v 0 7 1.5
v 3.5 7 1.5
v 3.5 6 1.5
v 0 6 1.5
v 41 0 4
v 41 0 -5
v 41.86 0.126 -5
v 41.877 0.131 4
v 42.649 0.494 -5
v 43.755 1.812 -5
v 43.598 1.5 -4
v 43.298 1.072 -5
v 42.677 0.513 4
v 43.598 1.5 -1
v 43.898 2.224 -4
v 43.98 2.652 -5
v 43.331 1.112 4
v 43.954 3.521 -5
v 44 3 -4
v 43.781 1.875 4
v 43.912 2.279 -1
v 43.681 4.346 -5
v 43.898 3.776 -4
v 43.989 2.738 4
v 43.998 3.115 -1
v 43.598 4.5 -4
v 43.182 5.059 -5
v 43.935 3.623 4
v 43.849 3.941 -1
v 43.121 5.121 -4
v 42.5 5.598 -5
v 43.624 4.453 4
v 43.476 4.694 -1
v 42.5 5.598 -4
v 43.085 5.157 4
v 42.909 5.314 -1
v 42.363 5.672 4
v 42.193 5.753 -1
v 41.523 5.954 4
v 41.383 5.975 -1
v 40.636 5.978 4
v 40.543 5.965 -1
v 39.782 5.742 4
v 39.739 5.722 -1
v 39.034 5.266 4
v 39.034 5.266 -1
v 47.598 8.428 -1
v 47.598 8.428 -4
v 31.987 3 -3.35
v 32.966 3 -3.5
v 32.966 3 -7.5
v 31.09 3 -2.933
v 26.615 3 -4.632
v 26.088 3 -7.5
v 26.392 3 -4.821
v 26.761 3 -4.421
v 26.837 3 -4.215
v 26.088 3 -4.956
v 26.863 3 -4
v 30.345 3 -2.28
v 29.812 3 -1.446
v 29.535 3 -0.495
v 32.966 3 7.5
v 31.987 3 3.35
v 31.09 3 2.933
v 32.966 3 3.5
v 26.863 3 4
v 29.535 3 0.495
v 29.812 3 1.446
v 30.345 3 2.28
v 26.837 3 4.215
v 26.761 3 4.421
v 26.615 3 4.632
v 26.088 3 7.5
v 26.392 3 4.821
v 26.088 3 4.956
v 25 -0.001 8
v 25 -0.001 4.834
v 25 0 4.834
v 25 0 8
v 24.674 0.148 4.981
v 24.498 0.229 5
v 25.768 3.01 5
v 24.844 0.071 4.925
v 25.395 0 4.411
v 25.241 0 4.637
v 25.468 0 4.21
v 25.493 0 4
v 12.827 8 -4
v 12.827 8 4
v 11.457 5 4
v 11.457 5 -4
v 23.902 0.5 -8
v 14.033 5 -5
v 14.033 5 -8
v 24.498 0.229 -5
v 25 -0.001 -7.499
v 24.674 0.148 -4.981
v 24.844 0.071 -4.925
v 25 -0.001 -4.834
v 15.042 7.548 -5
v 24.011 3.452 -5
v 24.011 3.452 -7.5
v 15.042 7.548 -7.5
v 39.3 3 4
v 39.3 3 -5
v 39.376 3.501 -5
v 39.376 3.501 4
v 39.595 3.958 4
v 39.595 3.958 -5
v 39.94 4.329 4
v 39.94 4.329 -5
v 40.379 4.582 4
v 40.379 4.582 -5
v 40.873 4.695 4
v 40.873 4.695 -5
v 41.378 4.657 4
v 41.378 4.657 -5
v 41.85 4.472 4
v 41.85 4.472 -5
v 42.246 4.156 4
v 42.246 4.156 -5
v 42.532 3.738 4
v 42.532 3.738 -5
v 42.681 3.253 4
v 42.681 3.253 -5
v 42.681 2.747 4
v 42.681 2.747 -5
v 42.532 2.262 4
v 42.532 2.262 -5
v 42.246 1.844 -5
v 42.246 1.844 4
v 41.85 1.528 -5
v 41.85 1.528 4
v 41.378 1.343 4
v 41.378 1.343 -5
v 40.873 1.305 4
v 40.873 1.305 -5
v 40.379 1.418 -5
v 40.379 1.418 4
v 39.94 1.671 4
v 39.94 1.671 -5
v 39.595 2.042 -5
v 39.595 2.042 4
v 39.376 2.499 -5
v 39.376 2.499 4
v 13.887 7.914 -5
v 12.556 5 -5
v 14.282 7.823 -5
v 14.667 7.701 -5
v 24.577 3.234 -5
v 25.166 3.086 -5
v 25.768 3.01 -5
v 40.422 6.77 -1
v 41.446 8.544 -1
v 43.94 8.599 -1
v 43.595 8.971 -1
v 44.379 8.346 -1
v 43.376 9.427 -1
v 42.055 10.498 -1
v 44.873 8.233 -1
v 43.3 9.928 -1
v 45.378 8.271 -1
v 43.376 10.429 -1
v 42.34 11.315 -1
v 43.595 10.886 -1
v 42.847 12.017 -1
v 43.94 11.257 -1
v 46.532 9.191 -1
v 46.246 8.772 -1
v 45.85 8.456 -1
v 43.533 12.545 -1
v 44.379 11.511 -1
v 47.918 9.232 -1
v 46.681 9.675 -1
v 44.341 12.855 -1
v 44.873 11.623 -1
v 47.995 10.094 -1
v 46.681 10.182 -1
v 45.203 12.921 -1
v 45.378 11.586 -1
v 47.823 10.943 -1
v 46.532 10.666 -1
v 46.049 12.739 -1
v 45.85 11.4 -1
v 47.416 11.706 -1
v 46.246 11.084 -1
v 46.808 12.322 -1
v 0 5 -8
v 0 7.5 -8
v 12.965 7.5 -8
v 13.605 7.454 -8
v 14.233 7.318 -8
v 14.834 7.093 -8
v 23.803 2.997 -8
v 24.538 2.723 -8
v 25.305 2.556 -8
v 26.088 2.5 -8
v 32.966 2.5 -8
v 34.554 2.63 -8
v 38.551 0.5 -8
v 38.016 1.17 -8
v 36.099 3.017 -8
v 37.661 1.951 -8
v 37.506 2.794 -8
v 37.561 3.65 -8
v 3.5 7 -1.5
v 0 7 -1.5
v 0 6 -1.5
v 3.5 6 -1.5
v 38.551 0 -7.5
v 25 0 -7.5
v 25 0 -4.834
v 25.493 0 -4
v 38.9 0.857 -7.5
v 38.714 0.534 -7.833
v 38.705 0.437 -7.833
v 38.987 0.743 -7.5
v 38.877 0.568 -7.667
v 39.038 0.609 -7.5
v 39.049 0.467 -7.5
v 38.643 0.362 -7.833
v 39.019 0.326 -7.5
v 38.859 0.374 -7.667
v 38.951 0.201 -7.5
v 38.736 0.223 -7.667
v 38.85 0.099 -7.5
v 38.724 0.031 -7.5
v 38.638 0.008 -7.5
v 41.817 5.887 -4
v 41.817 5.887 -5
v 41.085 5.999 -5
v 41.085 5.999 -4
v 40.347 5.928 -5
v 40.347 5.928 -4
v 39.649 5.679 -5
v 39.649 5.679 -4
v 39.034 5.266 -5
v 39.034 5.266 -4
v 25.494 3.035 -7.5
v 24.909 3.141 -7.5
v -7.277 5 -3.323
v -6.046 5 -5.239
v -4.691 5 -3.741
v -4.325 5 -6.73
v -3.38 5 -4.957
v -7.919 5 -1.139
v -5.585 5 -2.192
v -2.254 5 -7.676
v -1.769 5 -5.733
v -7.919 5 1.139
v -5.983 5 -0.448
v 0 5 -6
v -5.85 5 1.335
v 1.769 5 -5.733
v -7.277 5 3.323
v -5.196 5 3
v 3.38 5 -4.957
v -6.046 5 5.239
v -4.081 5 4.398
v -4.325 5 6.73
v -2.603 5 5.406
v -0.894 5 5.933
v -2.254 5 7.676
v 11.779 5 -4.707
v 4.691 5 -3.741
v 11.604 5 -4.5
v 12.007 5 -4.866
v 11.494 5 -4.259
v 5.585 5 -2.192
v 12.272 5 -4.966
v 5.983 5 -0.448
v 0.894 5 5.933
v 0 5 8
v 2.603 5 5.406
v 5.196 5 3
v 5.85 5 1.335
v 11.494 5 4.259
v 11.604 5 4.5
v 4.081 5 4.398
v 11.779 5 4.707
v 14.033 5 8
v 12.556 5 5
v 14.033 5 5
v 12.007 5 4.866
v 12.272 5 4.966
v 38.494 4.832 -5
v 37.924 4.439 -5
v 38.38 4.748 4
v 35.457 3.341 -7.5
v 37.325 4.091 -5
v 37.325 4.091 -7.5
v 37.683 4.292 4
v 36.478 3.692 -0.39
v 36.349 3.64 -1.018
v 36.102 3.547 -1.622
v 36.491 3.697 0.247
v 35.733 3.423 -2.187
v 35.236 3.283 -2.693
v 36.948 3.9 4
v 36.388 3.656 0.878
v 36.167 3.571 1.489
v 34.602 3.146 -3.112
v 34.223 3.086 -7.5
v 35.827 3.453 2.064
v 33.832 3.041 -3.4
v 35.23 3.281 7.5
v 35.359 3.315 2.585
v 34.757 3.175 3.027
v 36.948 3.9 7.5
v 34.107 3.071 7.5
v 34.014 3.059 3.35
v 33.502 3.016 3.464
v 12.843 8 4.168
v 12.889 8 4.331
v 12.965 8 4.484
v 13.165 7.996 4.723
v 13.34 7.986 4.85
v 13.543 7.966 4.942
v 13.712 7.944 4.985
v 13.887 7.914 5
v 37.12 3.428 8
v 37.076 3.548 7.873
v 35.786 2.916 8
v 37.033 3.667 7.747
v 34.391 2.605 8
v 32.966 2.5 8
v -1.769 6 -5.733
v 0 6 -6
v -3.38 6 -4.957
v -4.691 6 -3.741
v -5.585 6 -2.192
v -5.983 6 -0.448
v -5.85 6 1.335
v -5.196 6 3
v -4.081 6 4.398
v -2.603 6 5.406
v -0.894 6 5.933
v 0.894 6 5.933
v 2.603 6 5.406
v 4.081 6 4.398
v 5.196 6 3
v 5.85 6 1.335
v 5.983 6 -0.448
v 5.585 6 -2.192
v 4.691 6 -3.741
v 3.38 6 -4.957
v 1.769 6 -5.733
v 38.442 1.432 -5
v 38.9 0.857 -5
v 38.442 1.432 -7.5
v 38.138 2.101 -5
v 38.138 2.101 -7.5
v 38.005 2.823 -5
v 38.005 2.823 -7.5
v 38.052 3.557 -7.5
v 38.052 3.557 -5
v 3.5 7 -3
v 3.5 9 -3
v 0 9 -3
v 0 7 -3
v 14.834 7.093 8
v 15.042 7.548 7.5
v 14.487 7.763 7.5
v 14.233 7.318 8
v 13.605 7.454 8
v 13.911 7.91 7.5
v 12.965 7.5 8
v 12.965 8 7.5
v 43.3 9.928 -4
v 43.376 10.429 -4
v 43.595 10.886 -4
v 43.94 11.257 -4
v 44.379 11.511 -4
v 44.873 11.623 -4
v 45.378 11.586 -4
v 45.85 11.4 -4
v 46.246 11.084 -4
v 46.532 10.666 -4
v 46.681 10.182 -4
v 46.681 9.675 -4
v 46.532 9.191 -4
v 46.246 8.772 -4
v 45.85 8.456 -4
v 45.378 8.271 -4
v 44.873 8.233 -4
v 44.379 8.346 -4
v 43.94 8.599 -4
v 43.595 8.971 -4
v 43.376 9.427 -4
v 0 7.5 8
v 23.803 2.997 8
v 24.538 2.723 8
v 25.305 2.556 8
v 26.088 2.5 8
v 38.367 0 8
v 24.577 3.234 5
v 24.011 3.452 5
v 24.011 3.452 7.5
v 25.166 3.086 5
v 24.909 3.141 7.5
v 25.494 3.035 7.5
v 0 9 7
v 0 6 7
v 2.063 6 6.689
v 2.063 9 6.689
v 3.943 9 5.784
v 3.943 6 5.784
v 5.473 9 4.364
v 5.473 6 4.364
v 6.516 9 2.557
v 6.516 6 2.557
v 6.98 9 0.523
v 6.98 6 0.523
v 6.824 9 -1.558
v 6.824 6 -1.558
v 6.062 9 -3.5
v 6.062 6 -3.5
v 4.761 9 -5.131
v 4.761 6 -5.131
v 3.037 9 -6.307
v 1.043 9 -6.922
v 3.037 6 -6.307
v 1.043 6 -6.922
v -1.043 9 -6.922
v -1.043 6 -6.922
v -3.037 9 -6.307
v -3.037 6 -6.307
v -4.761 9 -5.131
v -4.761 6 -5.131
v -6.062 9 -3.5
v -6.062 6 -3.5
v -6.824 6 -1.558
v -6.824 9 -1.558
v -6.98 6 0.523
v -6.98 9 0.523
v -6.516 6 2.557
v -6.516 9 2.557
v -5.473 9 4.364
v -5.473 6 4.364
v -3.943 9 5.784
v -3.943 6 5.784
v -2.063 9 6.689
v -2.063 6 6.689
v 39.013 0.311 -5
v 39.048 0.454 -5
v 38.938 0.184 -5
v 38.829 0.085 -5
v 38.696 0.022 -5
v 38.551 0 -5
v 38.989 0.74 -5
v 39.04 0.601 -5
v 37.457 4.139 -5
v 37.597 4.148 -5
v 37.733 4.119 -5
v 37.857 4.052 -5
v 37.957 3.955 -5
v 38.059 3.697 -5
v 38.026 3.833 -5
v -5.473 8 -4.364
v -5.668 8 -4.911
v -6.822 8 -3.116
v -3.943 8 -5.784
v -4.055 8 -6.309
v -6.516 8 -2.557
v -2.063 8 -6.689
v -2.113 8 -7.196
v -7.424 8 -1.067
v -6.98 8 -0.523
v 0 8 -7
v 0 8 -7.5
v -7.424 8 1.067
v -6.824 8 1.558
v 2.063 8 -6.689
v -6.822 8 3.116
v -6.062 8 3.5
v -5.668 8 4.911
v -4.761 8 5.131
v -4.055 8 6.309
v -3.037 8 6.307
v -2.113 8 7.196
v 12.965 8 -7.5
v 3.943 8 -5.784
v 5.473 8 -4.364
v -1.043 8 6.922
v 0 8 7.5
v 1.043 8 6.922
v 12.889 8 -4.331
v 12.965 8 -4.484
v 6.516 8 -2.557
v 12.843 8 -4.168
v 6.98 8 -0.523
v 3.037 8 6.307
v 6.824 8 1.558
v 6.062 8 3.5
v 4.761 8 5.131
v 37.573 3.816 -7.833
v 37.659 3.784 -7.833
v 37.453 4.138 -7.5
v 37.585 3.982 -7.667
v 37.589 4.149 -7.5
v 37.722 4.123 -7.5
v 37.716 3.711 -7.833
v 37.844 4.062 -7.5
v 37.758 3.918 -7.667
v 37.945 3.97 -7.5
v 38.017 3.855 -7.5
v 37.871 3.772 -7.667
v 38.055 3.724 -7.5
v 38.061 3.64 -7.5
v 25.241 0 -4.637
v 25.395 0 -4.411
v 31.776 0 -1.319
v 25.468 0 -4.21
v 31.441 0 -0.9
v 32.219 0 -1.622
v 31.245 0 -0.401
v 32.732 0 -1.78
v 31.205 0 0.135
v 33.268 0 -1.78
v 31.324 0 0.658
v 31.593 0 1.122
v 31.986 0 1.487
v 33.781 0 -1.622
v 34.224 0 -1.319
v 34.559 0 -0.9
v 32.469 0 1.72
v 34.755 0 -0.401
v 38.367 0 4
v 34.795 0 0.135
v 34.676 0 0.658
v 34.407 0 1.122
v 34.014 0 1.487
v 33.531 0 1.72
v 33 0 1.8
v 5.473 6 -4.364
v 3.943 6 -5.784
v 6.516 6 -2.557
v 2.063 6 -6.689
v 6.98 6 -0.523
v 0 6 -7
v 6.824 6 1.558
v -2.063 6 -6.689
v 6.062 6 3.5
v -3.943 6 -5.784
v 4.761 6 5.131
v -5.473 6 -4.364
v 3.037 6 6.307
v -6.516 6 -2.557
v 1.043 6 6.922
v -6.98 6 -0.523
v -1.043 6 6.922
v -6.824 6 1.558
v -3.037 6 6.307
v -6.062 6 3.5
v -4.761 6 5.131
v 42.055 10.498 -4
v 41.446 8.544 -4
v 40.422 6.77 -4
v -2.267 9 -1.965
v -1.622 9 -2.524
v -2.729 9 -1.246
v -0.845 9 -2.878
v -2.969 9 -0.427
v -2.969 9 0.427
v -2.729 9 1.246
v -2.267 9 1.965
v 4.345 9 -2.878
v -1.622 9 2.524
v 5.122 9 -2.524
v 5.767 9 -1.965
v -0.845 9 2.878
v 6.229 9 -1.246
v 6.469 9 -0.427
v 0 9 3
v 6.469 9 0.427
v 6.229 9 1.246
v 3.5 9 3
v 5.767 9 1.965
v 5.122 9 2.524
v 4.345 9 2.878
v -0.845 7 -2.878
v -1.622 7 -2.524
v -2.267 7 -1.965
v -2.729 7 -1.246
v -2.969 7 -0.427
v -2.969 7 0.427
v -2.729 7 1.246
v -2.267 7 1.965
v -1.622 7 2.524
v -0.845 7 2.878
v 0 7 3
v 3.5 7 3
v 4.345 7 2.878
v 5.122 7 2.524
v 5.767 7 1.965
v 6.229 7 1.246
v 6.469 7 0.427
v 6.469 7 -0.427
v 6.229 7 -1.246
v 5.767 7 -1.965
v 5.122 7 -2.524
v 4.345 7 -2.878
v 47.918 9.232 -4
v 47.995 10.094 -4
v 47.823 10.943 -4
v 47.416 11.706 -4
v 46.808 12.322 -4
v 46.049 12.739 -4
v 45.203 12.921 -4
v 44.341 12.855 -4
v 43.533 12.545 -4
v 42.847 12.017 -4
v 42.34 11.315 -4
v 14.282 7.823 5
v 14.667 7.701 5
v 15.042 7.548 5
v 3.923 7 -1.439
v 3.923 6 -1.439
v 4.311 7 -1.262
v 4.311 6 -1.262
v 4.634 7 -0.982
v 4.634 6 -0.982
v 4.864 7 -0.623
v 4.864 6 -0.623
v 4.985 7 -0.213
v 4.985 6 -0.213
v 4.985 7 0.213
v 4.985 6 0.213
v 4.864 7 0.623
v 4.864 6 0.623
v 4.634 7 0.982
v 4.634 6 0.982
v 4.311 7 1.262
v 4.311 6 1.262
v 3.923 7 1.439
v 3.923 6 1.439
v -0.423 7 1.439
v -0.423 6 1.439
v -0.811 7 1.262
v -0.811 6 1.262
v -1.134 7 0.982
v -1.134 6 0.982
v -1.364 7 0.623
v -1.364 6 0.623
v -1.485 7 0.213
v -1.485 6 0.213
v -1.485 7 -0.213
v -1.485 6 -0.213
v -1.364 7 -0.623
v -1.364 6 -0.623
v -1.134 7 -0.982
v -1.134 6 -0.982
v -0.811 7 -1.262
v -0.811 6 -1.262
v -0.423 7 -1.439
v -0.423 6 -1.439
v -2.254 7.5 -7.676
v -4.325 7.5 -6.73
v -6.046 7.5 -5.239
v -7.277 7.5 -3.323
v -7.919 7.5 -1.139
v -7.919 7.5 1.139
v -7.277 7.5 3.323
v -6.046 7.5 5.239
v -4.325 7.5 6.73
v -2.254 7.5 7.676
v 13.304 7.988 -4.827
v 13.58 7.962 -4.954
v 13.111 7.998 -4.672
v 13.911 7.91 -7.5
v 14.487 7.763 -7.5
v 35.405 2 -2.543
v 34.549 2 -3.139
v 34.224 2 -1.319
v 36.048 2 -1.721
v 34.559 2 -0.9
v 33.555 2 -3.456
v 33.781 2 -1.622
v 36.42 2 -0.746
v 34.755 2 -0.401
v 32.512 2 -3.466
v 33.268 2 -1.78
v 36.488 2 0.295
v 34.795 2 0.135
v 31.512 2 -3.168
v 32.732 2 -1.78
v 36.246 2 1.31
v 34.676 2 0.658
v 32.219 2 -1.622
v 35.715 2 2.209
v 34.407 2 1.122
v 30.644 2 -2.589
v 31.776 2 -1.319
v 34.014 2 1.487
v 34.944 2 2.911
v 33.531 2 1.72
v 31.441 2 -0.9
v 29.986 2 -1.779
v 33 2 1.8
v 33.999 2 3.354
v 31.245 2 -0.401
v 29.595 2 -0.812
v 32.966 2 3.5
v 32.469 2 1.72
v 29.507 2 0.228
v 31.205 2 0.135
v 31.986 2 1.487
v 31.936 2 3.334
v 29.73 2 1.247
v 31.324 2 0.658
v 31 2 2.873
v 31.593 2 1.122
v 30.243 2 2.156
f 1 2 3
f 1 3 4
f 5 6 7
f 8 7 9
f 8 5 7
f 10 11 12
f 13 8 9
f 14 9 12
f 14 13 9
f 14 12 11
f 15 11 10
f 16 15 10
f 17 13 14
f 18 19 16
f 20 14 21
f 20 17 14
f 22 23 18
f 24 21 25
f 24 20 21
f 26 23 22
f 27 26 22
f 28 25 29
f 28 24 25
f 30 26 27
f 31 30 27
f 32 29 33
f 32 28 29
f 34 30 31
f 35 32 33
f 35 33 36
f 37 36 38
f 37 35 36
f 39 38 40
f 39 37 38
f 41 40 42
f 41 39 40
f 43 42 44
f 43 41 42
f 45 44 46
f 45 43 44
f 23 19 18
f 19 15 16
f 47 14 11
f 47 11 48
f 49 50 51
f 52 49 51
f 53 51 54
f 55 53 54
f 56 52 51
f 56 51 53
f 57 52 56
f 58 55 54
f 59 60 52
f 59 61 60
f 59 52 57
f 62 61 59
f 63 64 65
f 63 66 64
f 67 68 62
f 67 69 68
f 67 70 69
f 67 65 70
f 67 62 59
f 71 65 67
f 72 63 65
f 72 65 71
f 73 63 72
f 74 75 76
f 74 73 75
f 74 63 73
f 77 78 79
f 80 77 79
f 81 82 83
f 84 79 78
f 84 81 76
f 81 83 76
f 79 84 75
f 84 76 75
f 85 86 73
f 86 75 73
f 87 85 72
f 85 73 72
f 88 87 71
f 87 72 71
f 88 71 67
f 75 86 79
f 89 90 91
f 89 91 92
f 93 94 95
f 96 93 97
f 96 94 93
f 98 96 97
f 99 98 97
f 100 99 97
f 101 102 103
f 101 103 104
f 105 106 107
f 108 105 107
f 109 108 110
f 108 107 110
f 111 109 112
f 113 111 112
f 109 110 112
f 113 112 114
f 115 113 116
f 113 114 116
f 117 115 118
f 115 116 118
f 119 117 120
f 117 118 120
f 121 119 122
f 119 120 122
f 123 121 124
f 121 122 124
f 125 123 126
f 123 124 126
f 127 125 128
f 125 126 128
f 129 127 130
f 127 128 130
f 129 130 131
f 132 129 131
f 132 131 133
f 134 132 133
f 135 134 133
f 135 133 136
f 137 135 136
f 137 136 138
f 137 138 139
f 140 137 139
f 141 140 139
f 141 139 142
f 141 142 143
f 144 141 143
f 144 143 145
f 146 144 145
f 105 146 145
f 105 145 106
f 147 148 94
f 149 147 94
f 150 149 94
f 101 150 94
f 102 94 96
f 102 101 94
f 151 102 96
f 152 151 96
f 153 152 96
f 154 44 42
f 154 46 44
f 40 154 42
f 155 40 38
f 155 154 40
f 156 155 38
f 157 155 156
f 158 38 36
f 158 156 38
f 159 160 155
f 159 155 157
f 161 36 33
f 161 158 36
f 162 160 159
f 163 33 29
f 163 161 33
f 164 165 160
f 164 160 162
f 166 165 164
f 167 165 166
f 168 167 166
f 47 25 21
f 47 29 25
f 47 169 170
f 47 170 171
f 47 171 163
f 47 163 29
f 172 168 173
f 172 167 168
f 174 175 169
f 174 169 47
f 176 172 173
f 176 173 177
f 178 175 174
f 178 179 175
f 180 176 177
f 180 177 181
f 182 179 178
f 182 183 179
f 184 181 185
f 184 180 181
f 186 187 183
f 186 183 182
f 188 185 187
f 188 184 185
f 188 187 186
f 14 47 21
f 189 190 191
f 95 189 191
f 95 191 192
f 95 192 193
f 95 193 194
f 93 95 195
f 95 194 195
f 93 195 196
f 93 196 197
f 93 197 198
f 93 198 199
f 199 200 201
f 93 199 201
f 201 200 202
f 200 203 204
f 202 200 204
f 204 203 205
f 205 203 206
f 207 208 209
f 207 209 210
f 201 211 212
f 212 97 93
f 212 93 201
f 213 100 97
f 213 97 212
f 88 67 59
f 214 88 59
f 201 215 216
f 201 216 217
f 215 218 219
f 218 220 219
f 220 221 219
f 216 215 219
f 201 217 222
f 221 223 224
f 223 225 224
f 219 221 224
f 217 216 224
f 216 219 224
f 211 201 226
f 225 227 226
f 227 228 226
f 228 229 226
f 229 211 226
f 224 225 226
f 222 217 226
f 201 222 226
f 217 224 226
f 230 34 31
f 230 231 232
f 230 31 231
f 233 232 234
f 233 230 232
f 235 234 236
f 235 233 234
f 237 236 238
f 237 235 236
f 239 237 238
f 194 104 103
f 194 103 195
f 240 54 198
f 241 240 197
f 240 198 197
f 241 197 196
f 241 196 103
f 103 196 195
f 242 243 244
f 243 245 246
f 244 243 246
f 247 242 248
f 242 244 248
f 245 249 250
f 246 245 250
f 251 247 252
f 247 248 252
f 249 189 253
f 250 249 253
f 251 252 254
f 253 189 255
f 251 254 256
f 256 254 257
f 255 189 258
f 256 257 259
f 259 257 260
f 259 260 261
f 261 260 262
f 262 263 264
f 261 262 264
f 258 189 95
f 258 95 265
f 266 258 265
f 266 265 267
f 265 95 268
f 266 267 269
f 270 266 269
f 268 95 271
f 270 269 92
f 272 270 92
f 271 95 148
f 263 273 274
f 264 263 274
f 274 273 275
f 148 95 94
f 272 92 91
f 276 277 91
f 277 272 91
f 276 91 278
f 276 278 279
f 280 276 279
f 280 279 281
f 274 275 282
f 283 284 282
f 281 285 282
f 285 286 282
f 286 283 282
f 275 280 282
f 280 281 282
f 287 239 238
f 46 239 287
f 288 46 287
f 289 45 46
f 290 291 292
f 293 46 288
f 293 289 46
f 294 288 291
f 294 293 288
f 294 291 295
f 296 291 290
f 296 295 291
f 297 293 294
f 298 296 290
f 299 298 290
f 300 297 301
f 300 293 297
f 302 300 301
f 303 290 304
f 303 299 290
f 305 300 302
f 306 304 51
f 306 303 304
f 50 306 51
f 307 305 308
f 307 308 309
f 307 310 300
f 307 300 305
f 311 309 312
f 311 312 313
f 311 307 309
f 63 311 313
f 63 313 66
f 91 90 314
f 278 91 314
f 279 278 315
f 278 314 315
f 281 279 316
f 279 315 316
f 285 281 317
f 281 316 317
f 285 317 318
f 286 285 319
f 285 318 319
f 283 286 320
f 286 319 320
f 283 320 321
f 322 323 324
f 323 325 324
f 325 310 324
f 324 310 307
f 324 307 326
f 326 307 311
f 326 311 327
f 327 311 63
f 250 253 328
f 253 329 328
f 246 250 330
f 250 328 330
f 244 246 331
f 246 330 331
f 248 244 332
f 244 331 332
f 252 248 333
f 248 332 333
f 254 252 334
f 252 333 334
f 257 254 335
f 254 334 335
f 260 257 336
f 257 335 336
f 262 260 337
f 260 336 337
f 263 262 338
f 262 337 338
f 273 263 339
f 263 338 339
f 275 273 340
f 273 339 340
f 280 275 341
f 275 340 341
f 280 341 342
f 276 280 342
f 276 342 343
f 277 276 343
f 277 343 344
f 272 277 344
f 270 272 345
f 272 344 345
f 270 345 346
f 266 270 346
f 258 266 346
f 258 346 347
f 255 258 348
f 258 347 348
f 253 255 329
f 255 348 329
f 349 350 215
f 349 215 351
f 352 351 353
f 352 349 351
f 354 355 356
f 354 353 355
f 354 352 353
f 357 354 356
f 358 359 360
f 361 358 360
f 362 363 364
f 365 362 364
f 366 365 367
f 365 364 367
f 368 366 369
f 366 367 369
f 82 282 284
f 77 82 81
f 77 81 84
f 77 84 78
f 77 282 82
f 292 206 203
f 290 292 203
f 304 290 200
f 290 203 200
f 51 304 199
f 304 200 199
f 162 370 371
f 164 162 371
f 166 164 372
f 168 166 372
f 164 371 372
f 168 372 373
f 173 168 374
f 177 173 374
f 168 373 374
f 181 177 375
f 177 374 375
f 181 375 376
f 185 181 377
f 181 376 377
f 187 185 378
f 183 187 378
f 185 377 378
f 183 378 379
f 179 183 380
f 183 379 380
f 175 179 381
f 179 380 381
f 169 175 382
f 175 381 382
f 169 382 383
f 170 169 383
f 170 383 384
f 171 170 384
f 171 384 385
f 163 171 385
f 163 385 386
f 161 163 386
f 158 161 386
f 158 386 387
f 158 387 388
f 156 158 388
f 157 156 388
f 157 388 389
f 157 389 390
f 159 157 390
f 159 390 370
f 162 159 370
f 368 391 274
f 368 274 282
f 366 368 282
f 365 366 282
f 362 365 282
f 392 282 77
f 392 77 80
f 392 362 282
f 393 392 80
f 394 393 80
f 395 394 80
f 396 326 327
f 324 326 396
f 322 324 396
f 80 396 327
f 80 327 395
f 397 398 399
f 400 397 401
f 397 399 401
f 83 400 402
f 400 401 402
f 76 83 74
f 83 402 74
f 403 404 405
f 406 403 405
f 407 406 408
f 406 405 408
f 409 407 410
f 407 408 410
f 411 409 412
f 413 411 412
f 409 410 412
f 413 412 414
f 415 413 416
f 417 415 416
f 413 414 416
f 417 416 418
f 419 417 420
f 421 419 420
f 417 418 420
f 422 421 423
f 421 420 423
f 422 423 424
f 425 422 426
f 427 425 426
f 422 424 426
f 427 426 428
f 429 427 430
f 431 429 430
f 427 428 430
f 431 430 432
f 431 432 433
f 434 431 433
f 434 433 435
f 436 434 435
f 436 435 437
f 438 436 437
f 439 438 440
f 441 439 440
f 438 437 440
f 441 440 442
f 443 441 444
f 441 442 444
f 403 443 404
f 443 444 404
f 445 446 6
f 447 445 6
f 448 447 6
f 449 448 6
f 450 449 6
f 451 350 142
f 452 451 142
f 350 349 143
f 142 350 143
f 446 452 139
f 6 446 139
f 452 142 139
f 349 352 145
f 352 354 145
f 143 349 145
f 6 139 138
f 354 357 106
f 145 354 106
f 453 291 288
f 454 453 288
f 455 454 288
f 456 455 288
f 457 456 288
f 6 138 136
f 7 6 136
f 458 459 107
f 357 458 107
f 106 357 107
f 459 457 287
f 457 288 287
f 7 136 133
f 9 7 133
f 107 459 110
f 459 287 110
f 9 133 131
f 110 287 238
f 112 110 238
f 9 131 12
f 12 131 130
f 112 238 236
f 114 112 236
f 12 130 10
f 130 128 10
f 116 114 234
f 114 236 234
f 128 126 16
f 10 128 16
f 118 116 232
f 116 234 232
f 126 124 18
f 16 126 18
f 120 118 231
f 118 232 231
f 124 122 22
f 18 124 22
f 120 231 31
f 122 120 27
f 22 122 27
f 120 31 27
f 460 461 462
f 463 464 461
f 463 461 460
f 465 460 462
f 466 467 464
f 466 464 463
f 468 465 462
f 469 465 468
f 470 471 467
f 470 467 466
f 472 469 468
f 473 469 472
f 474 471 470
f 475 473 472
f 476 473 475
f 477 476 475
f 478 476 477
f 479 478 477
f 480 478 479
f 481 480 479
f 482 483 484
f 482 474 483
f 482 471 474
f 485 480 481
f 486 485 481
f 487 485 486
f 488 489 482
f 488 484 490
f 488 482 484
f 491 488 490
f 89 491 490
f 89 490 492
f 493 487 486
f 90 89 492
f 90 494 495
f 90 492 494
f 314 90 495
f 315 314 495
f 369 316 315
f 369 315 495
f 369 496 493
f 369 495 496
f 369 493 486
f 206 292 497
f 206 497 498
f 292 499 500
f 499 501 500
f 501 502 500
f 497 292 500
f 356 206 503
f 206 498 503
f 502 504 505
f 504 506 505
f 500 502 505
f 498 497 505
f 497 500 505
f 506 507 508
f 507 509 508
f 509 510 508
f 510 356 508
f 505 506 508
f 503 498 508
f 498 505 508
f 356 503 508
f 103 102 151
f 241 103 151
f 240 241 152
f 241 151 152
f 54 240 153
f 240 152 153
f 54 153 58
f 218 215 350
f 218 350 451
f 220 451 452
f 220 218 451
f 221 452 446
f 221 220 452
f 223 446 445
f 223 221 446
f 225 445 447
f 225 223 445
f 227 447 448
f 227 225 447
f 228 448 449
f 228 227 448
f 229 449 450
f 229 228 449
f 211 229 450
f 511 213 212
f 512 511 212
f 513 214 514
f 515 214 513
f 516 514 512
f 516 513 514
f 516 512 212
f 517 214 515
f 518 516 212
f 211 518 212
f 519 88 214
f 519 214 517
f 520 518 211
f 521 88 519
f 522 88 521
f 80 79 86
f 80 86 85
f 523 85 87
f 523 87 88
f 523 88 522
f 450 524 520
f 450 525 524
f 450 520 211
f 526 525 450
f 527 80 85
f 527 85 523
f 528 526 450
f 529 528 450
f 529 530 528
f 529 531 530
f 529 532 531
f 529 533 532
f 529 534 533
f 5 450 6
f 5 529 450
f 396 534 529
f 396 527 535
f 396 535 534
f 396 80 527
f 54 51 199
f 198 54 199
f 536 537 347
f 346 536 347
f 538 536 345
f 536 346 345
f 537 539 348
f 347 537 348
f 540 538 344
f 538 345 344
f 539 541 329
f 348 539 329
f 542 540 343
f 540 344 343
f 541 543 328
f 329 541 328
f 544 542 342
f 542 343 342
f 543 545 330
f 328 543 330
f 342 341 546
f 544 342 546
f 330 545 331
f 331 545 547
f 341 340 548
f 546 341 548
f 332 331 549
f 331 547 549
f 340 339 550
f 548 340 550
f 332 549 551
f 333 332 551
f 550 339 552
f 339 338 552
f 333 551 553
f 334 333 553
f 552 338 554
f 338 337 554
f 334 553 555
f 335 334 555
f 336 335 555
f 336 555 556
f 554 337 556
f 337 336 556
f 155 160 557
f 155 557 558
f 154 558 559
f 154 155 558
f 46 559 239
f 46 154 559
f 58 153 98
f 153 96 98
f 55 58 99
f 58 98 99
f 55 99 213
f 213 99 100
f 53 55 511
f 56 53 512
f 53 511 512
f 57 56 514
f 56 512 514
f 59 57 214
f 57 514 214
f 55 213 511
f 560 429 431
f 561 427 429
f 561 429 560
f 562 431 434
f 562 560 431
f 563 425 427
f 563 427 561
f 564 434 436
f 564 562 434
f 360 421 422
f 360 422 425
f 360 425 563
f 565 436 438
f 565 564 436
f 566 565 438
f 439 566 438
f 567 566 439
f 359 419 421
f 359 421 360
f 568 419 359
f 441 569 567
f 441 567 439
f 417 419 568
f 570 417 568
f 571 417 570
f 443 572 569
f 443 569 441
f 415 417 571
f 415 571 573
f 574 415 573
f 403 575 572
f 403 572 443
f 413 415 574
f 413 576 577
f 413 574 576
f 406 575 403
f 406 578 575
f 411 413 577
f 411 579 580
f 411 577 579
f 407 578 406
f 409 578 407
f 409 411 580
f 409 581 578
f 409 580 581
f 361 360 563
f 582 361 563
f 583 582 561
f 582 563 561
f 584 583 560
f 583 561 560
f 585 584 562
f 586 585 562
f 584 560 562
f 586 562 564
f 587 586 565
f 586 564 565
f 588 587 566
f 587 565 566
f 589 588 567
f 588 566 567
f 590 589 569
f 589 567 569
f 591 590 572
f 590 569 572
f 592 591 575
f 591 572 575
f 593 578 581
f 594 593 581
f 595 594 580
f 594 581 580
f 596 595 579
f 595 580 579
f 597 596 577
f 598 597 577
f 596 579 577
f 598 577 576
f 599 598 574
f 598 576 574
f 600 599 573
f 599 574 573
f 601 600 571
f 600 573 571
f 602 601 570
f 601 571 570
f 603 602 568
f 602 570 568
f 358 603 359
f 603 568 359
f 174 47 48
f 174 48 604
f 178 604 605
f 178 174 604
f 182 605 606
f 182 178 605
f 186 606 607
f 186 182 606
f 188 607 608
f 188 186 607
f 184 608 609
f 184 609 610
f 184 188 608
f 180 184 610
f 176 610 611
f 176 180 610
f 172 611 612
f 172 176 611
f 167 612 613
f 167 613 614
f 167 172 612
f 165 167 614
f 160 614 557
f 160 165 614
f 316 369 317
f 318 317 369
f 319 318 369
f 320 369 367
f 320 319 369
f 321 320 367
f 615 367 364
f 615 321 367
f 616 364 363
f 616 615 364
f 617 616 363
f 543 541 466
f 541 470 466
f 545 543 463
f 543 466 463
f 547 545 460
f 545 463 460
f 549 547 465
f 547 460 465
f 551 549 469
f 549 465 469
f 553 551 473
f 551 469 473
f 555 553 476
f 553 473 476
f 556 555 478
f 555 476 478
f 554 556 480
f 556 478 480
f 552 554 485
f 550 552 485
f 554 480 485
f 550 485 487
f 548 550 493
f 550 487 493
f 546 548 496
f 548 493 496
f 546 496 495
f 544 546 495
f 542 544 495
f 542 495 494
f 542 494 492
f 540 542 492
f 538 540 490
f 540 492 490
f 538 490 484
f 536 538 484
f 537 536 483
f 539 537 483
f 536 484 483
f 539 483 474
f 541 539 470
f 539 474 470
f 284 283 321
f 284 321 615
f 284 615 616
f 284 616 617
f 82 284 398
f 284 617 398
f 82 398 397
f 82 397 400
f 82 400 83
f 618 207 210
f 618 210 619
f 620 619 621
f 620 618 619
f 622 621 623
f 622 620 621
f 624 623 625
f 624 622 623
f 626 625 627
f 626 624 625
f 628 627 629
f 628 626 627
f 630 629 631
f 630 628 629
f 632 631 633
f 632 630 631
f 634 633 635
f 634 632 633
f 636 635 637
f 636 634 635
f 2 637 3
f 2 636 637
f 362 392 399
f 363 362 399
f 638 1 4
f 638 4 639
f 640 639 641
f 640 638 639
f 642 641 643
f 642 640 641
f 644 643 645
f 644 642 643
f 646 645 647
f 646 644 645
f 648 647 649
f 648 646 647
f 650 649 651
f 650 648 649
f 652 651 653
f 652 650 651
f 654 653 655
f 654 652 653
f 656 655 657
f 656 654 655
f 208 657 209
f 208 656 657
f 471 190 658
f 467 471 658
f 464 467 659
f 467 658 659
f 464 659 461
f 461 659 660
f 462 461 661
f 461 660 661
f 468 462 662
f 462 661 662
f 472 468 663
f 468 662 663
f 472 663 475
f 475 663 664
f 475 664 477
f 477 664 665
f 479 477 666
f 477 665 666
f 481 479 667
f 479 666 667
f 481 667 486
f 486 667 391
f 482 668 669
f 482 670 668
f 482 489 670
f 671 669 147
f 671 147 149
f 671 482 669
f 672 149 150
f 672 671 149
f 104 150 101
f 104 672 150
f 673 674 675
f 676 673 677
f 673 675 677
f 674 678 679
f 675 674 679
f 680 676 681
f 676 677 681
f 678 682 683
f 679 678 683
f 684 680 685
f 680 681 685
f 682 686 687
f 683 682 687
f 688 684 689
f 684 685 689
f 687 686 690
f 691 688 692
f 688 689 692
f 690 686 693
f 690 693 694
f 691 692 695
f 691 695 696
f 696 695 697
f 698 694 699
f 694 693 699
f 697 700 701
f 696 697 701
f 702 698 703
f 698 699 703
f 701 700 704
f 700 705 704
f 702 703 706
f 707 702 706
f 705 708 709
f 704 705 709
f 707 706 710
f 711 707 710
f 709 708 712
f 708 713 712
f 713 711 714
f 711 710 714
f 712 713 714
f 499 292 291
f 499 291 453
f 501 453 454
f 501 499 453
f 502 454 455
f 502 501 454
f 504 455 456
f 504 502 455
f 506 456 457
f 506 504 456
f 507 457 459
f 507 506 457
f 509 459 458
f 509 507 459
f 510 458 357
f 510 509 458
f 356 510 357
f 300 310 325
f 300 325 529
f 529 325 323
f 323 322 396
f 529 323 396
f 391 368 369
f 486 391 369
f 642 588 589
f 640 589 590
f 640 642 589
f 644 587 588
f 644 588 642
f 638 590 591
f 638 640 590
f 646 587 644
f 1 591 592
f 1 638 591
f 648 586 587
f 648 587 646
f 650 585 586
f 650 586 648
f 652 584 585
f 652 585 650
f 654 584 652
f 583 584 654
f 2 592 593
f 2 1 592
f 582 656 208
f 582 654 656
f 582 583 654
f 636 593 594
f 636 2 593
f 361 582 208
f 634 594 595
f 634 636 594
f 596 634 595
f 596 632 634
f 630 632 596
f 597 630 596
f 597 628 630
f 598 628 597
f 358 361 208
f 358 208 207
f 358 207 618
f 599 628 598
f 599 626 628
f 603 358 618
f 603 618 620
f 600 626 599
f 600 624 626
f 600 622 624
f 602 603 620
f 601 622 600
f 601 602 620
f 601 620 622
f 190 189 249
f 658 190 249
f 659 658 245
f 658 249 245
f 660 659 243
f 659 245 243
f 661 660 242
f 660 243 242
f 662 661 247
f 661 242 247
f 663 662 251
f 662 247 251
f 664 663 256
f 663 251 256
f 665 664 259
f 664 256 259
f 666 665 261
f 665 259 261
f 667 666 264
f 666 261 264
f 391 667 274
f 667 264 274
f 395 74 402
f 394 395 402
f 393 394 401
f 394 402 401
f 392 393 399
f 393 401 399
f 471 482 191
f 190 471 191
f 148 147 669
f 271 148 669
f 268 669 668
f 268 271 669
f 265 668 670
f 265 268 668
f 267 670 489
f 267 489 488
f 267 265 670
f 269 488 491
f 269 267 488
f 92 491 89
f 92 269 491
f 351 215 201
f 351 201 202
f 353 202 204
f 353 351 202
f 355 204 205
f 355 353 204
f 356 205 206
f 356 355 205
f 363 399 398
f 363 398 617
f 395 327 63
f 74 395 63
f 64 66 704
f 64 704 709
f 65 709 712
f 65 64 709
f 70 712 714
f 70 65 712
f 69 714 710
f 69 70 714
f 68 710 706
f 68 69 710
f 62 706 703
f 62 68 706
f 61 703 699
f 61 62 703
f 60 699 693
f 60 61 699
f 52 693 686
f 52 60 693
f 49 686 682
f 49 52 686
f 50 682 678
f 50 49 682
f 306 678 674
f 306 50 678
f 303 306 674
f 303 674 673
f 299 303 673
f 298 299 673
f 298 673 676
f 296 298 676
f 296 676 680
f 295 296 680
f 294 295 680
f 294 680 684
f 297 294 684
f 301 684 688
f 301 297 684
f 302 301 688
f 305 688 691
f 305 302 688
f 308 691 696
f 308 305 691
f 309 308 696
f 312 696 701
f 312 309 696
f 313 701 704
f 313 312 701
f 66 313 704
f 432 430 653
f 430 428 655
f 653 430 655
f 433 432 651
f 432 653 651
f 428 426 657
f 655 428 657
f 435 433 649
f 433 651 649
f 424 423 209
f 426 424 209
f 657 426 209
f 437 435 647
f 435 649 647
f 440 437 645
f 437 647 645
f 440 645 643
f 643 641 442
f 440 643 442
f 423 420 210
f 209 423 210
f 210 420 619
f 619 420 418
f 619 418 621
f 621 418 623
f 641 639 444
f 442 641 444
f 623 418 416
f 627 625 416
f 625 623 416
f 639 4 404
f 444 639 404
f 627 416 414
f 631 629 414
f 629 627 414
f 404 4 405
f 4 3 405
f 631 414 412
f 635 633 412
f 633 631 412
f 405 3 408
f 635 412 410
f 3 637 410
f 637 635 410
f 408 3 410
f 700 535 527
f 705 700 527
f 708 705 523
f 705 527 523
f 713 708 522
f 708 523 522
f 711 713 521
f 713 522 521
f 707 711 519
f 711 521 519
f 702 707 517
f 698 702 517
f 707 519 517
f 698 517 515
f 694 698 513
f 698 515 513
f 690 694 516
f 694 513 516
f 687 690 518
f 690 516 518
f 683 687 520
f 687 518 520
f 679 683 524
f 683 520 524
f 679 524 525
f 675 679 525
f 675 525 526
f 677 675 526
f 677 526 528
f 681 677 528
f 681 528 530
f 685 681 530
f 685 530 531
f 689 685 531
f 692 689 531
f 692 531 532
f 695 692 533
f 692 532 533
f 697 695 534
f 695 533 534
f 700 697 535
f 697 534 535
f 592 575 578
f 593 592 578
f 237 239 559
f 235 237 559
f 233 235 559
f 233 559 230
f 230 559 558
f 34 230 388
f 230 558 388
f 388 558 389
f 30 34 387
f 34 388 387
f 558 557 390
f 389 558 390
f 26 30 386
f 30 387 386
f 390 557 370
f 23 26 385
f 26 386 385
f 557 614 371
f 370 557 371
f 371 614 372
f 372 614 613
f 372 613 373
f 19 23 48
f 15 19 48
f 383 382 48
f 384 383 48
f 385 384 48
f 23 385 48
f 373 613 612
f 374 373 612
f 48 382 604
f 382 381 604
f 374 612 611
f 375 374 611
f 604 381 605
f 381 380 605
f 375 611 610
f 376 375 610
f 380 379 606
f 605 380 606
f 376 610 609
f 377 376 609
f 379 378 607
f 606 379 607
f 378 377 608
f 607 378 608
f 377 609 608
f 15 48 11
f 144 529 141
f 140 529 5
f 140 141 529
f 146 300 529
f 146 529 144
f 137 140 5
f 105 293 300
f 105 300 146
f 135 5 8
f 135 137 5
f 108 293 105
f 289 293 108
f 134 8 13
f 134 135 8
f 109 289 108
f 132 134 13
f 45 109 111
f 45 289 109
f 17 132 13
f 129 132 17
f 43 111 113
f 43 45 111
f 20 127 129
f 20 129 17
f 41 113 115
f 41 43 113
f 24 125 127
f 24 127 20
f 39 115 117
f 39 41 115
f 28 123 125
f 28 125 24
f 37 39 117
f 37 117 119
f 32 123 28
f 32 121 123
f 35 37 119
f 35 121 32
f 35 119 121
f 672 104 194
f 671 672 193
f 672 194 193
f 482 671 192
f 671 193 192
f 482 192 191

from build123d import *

# Parameters (mm, degrees)
BOSS_EXTRUDE1_DEPTH  = 8
BOSS_EXTRUDE2_START  = -1
BOSS_EXTRUDE2_DEPTH  = 3
CUT_EXTRUDE1_START   = -3
SKETCH2_R            = 3
CUT_EXTRUDE1_DEPTH   = 3
CUT_EXTRUDE2_DEPTH   = 4
SKETCH4_R            = 3.5
CUT_EXTRUDE3_DEPTH   = 8
M3_CLEARANCE_HOLE2_D = 3.4
M3_CLEARANCE_HOLE3_D = 3.4
SKETCH10_R           = 8
BOSS_EXTRUDE3_DEPTH  = 3
BOSS_EXTRUDE6_DEPTH  = 8
SKETCH17_W           = 6
SKETCH17_H           = 6
SKETCH18_R           = 7
BOSS_EXTRUDE5_DEPTH  = 3
CUT_EXTRUDE6_DEPTH   = 2
CUT_EXTRUDE7_DEPTH   = 50.487466177
FILLET5_START        = -8
FILLET5_DEPTH        = 3
SKETCH22_W           = 1.8
SKETCH22_H           = 2.051551118
FILLET12_R           = 5
CHAMFER2_SIZE        = 0.5
SKETCH27_W           = 14.844395474
SKETCH27_H           = 10
CUT_EXTRUDE11_DEPTH  = 13.5
FILLET13_R           = 1


with BuildPart() as part:
    # Sketch1 → Boss-Extrude1 (new, symmetric)
    with BuildSketch(Plane.XY):
        with BuildLine():
            ThreePointArc((42.5, 5.598076211), (40.713681898, 5.986305735), (39.03367226, 5.265735028))
            ThreePointArc((39.03367226, 5.265735028), (36.204522615, 3.584912586), (32.966138903, 3))
            Line((32.966138903, 3), (25, 3))
            Line((25, 3), (25, 0))
            Line((25, 0), (41, 0))
            ThreePointArc((41, 0), (43.897777479, 2.223542865), (42.5, 5.598076211))
        make_face()
    extrude(amount=BOSS_EXTRUDE1_DEPTH, both=True)

    # Sketch1<3> → Boss-Extrude2 (add)
    with BuildSketch(Plane.XY.offset(BOSS_EXTRUDE2_START)):
        with BuildLine():
            ThreePointArc((39.03367226, 5.265735028), (42.909179564, 5.314094508), (43.598076211, 1.5))
            Line((43.598076211, 1.5), (47.598076211, 8.42820323))
            ThreePointArc((47.598076211, 8.42820323), (46.049474916, 12.738648462), (42.054652064, 10.498225632))
            ThreePointArc((42.054652064, 10.498225632), (40.983069487, 7.628577072), (39.03367226, 5.265735028))
        make_face()
    extrude(amount=-BOSS_EXTRUDE2_DEPTH)

    # Sketch2 → Cut-Extrude1 (cut)
    with BuildSketch(Plane(origin=(0, 0, -8), x_dir=(-1, 0, 0), z_dir=(0, 0, -1)).offset(CUT_EXTRUDE1_START)):
        with Locations((-41, 3)):
            Circle(SKETCH2_R)
    extrude(amount=CUT_EXTRUDE1_DEPTH, mode=Mode.SUBTRACT)

    # Sketch3 → Cut-Extrude2 (cut)
    with BuildSketch(Plane.XY.offset(8)):
        with BuildLine():
            ThreePointArc((39.033672152, 5.265734934), (38.036918658, 4.512343291), (36.947790029, 3.900039993))
            Line((36.947790029, 3.900039993), (38.367288499, 0))
            Line((38.367288499, 0), (41, 0))
            ThreePointArc((41, 0), (43.810445232, 4.049474916), (39.033672152, 5.265734934))
        make_face()
    extrude(amount=-CUT_EXTRUDE2_DEPTH, mode=Mode.SUBTRACT)

    # Sketch4 → Cut-Extrude3 (cut)
    with BuildSketch(Plane(origin=(0, 10, 0), x_dir=(-1, 0, 0), z_dir=(0, -1, 0))):
        with Locations(Location((-33, 0, 0), (0, 0, 270.554322343))):
            Circle(SKETCH4_R)
    extrude(amount=CUT_EXTRUDE3_DEPTH, mode=Mode.SUBTRACT)

    # M3 Clearance Hole2 (through all)
    with Locations(Plane(origin=(41, 3, 4), x_dir=(1, 0, 0), z_dir=(0, 0, 1))):
        with Locations((0, 0)):
            Hole(M3_CLEARANCE_HOLE2_D / 2)

    # M3 Clearance Hole3 (through all)
    with Locations(Plane(origin=(45, 9.92820323, -1), x_dir=(1, 0, 0), z_dir=(0, 0, 1))):
        with Locations((0, 0)):
            Hole(M3_CLEARANCE_HOLE3_D / 2)



with BuildPart() as body_2:
    # Sketch10 → Boss-Extrude3 (new body)
    with BuildSketch(Plane(origin=(0, 5, 0), x_dir=(1, 0, 0), z_dir=(0, 1, 0))):
        with Locations(Location((0, 0, 0), (0, 0, 270))):
            Circle(SKETCH10_R)
    extrude(amount=BOSS_EXTRUDE3_DEPTH)


with BuildPart() as part_1:
    add(part.part)

    add(body_2.part)  # Boss-Extrude6 merges body 2
    # Sketch25 → Boss-Extrude6 (add, symmetric)
    with BuildSketch(Plane.XY):
        Polygon((0, 8), (0, 5), (14.033339128, 5), (25, -0.000517039), (25, 3), (14.052552674, 8), align=None)
    extrude(amount=BOSS_EXTRUDE6_DEPTH, both=True)

    # Sketch17 → Cut-Revolve1 (revolve, cut)
    with BuildSketch(Plane.XY, mode=Mode.PRIVATE) as cut_revolve1_sk:
        Polygon((0, 8), (0, 6), (6, 6), (7, 6), (7, 8), align=None)
        with Locations((3, 3)):
            Rectangle(SKETCH17_W, SKETCH17_H)
    revolve(cut_revolve1_sk.sketch.rotate(Axis((0, 6, 0), (0, 1, 0)), 90), axis=Axis((0, 6, 0), (0, 1, 0)), mode=Mode.SUBTRACT)

    # Fillet5: read off the stored shape, not the designer's step
    # Fillet5 outline → Fillet5 (cut)
    with BuildSketch(Plane.XY.offset(FILLET5_START)):
        with BuildLine():
            ThreePointArc((41, 0), (39.866106581, 0.222539701), (38.900437363, 0.857142857))
            ThreePointArc((38.900437363, 0.857142857), (39.013420307, 0.311017763), (38.550510257, 0))
            Line((38.550510257, 0), (41, 0))
        make_face()
        with BuildLine():
            ThreePointArc((37.325347494, 4.090624707), (37.856812417, 4.05249044), (38.052112821, 3.556741573))
            ThreePointArc((38.052112821, 3.556741573), (38.398550037, 4.494141254), (39.033672152, 5.265734934))
            ThreePointArc((39.033672152, 5.265734934), (38.212514543, 4.630198979), (37.325347494, 4.090624707))
        make_face()
    extrude(amount=FILLET5_DEPTH, mode=Mode.SUBTRACT)

    # Sketch22 → M3 Clearance Hole5 (revolve, cut)
    with BuildSketch(Plane(origin=(33, 2, 0), x_dir=(0, 0, 1), z_dir=(1, 0, 0))):
        with Locations((0.9, 1.025775559)):
            Rectangle(SKETCH22_W, SKETCH22_H)
    revolve(axis=Axis((33, 8.35, 0), (0, -1, 0)), mode=Mode.SUBTRACT)

    # Fillet12
    fillet12_edges = [part_1.edges().sort_by_distance(p)[0] for p in [
        (25, 3, 0),
        (14.052552674, 8, 0),
    ]]
    fillet(fillet12_edges, radius=FILLET12_R)

    # Chamfer2
    # the kernel refuses this chamfer: 0.5 mm, written as the material it takes off along each edge
    with BuildSketch(Plane(origin=(41, 3, -8), x_dir=(-0.6998542122558625, -0.7142857142542653, 0), z_dir=(0.7142857142542653, -0.6998542122558625, 0))) as chamfer2_piece_1:
        with BuildLine():
            Line((3.514142136, 0.014142136), (2.985857864, -0.514142136))
            Line((2.985857864, -0.514142136), (2.975857864, -0.514142136))
            ThreePointArc((2.975857864, -0.514142136), (2.99, -0.257071068), (2.99, 0))
            Line((2.99, 0), (3, 0.01))
            ThreePointArc((3, 0.01), (3.257071068, 0.01), (3.514142136, 0.024142136))
            Line((3.514142136, 0.024142136), (3.514142136, 0.014142136))
        make_face()
    revolve(axis=Axis((41, 3, -8), (0, 0, -1)), revolution_arc=56.279671506, mode=Mode.SUBTRACT)
    with BuildSketch(Plane(origin=(37.560798292, 3.649531835, -8), x_dir=(-0.4709015955498913, 0.8821857442220241, 0), z_dir=(-0.8821857442220241, -0.4709015955498913, 0))) as chamfer2_piece_2:
        with BuildLine():
            Line((0.5 - CHAMFER2_SIZE, -CHAMFER2_SIZE * 8.25029964485e-10), (0.514142135, -0.514142136))
            Line((0.514142135, -0.514142136), (0.524142135, -0.514142136))
            ThreePointArc((0.524142135, -0.514142136), (0.51, -0.257071068), (0.51, 0))
            Line((0.51, 0), (0.5, 0.01))
            Line((0.5, 0.01), (0, 0.023753138))
            Line((0, 0.023753138), (0.5 - CHAMFER2_SIZE, -CHAMFER2_SIZE * 8.25029964485e-10))
        make_face()
    revolve(axis=Axis((37.560798292, 3.649531835, -8), (0, 0, -1)), revolution_arc=128.787817104, mode=Mode.SUBTRACT)
    with BuildSketch(Plane(origin=(38.550510258, 0.5, -8), x_dir=(0.6998542113861314, 0.7142857151064245, 0), z_dir=(-0.7142857151064245, 0.6998542113861314, 0))) as chamfer2_piece_3:
        with BuildLine():
            Line((0.5 - CHAMFER2_SIZE, -CHAMFER2_SIZE * 6.45420560746e-10), (0.514142135, -0.514142136))
            Line((0.514142135, -0.514142136), (0.524142135, -0.514142136))
            ThreePointArc((0.524142135, -0.514142136), (0.51, -0.257071068), (0.51, 0))
            Line((0.51, 0), (0.5, 0.01))
            Line((0.5, 0.01), (0, 0.023753138))
            Line((0, 0.023753138), (0.5 - CHAMFER2_SIZE, -CHAMFER2_SIZE * 6.45420560746e-10))
        make_face()
    revolve(axis=Axis((38.550510258, 0.5, -8), (0, 0, -1)), revolution_arc=135.584691531, mode=Mode.SUBTRACT)
    with BuildSketch(Plane(origin=(12.964776572, 8, -8), x_dir=(0, 0, 1), z_dir=(-1, 0, 0)), Plane(origin=(12.964776572, 8, 8), x_dir=(0, -1, 0), z_dir=(-1, 0, 0))) as chamfer2_piece_4:
        with BuildLine():
            Line((0.514142136, 0.014142136), (-0.014142136, -0.514142136))
            Line((-0.014142136, -0.514142136), (-0.024142136, -0.514142136))
            ThreePointArc((-0.024142136, -0.514142136), (-0.01, -0.257071068), (-0.01, 0))
            Line((-0.01, 0), (0, 0.01))
            ThreePointArc((0, 0.01), (0.257071068, 0.01), (0.514142136, 0.024142136))
            Line((0.514142136, 0.024142136), (0.514142136, 0.014142136))
        make_face()
    extrude(amount=12.964776572, mode=Mode.SUBTRACT)
    with BuildSketch(Plane(origin=(24.01054005, 3.451913547, -8), x_dir=(0, 0, 1), z_dir=(-0.9096172905898658, 0.41544721043708044, 0)), Plane(origin=(24.01054005, 3.451913547, 8), x_dir=(-0.4154472104370804, -0.9096172905898657, 0), z_dir=(-0.9096172905898658, 0.41544721043708044, 0))) as chamfer2_piece_5:
        with BuildLine():
            Line((0.514142136, 0.014142136), (-0.014142136, -0.514142136))
            Line((-0.014142136, -0.514142136), (-0.024142136, -0.514142136))
            ThreePointArc((-0.024142136, -0.514142136), (-0.01, -0.257071068), (-0.01, 0))
            Line((-0.01, 0), (0, 0.01))
            ThreePointArc((0, 0.01), (0.257071068, 0.01), (0.514142136, 0.024142136))
            Line((0.514142136, 0.024142136), (0.514142136, 0.014142136))
        make_face()
    extrude(amount=9.859671224, mode=Mode.SUBTRACT)
    with BuildSketch(Plane(origin=(32.966138903, 3, -8), x_dir=(0, 0, 1), z_dir=(-1, 0, 0)), Plane(origin=(32.966138903, 3, 8), x_dir=(0, -1, 0), z_dir=(-1, 0, 0))) as chamfer2_piece_6:
        with BuildLine():
            Line((0.514142136, 0.014142136), (-0.014142136, -0.514142136))
            Line((-0.014142136, -0.514142136), (-0.024142136, -0.514142136))
            ThreePointArc((-0.024142136, -0.514142136), (-0.01, -0.257071068), (-0.01, 0))
            Line((-0.01, 0), (0, 0.01))
            ThreePointArc((0, 0.01), (0.257071068, 0.01), (0.514142136, 0.024142136))
            Line((0.514142136, 0.024142136), (0.514142136, 0.014142136))
        make_face()
    extrude(amount=6.878362801, mode=Mode.SUBTRACT)
    with BuildSketch(Plane(origin=(12.964776572, 3, -8), x_dir=(0.4154472104370811, 0.9096172905898655, 0), z_dir=(0.9096172905898655, -0.4154472104370811, 0))) as chamfer2_piece_7:
        with BuildLine():
            Line((5.014142136, 0.514142136), (4.485857864, -0.014142136))
            Line((4.485857864, -0.014142136), (4.485857864, -0.024142136))
            ThreePointArc((4.485857864, -0.024142136), (4.742928932, -0.01), (5, -0.01))
            Line((5, -0.01), (5.01, 0))
            ThreePointArc((5.01, 0), (5.01, 0.257071068), (5.024142136, 0.514142136))
            Line((5.024142136, 0.514142136), (5.014142136, 0.514142136))
        make_face()
    revolve(axis=Axis((12.964776572, 3, -8), (0, 0, 1)), revolution_arc=24.54748261, mode=Mode.SUBTRACT)
    with BuildSketch(Plane(origin=(12.964776572, 3, 8), x_dir=(0.4154472104370811, 0.9096172905898655, 0), z_dir=(0.9096172905898655, -0.4154472104370811, 0))) as chamfer2_piece_8:
        with BuildLine():
            Line((4.485857864, 0.014142136), (5.014142136, -0.514142136))
            Line((5.014142136, -0.514142136), (5.024142136, -0.514142136))
            ThreePointArc((5.024142136, -0.514142136), (5.01, -0.257071068), (5.01, 0))
            Line((5.01, 0), (5, 0.01))
            ThreePointArc((5, 0.01), (4.742928932, 0.01), (4.485857864, 0.024142136))
            Line((4.485857864, 0.024142136), (4.485857864, 0.014142136))
        make_face()
    revolve(axis=Axis((12.964776572, 3, 8), (0, 0, 1)), revolution_arc=24.54748261, mode=Mode.SUBTRACT)
    with BuildSketch(Plane(origin=(26.087776102, 8, -8), x_dir=(0, -1, 0), z_dir=(1, 0, 0))) as chamfer2_piece_9:
        with BuildLine():
            Line((4.985857864, -0.514142136), (5.514142136, 0.014142136))
            Line((5.514142136, 0.014142136), (5.514142136, 0.024142136))
            ThreePointArc((5.514142136, 0.024142136), (5.257071068, 0.01), (5, 0.01))
            Line((5, 0.01), (4.99, 0))
            ThreePointArc((4.99, 0), (4.99, -0.257071068), (4.975857864, -0.514142136))
            Line((4.975857864, -0.514142136), (4.985857864, -0.514142136))
        make_face()
    revolve(axis=Axis((26.087776102, 8, -8), (0, 0, -1)), revolution_arc=24.54748261, mode=Mode.SUBTRACT)
    with BuildSketch(Plane(origin=(26.087776102, 8, 8), x_dir=(0, -1, 0), z_dir=(1, 0, 0))) as chamfer2_piece_10:
        with BuildLine():
            Line((5.514142136, -0.014142136), (4.985857864, 0.514142136))
            Line((4.985857864, 0.514142136), (4.975857864, 0.514142136))
            ThreePointArc((4.975857864, 0.514142136), (4.99, 0.257071068), (4.99, 0))
            Line((4.99, 0), (5, -0.01))
            ThreePointArc((5, -0.01), (5.257071068, -0.01), (5.514142136, -0.024142136))
            Line((5.514142136, -0.024142136), (5.514142136, -0.014142136))
        make_face()
    revolve(axis=Axis((26.087776102, 8, 8), (0, 0, -1)), revolution_arc=24.54748261, mode=Mode.SUBTRACT)
    with BuildSketch(Plane(origin=(32.966138903, 12.25715402, 8), x_dir=(0.550971832426983, -0.8345238402059301, 0), z_dir=(0.8345238402059301, 0.550971832426983, 0))) as chamfer2_piece_11:
        with BuildLine():
            Line((9.771296156, -0.014142136), (9.243011885, 0.514142136))
            Line((9.243011885, 0.514142136), (9.233011885, 0.514142136))
            ThreePointArc((9.233011885, 0.514142136), (9.24715402, 0.257071068), (9.24715402, 0))
            Line((9.24715402, 0), (9.25715402, -0.01))
            ThreePointArc((9.25715402, -0.01), (9.514225088, -0.01), (9.771296156, -0.024142136))
            Line((9.771296156, -0.024142136), (9.771296156, -0.014142136))
        make_face()
    revolve(axis=Axis((32.966138903, 12.25715402, 8), (0, 0, -1)), revolution_arc=33.433710309, mode=Mode.SUBTRACT)
    with BuildSketch(Plane(origin=(32.966138903, 12.25715402, -8), x_dir=(0.4709015947015472, -0.8821857446748615, 0), z_dir=(0.8821857446748615, 0.4709015947015472, 0))) as chamfer2_piece_12:
        with BuildLine():
            Line((9.243011885, -0.514142136), (9.771296156, 0.014142136))
            Line((9.771296156, 0.014142136), (9.771296156, 0.024142136))
            ThreePointArc((9.771296156, 0.024142136), (9.514225088, 0.01), (9.25715402, 0.01))
            Line((9.25715402, 0.01), (9.24715402, 0))
            ThreePointArc((9.24715402, 0), (9.24715402, -0.257071068), (9.233011885, -0.514142136))
            Line((9.233011885, -0.514142136), (9.243011885, -0.514142136))
        make_face()
    revolve(axis=Axis((32.966138903, 12.25715402, -8), (0, 0, -1)), revolution_arc=28.092836925, mode=Mode.SUBTRACT)
    with BuildSketch(Plane(origin=(23.714158506, 0, -8), x_dir=(0, 0, 1), z_dir=(1, 0, 0))) as chamfer2_piece_13:
        with BuildLine():
            Line((0.514142136, 0.014142136), (-0.014142136, -0.514142136))
            Line((-0.014142136, -0.514142136), (-0.024142136, -0.514142136))
            ThreePointArc((-0.024142136, -0.514142136), (-0.01, -0.257071068), (-0.01, 0))
            Line((-0.01, 0), (0, 0.01))
            ThreePointArc((0, 0.01), (0.257071068, 0.01), (0.514142136, 0.024142136))
            Line((0.514142136, 0.024142136), (0.514142136, 0.014142136))
        make_face()
    extrude(amount=14.836351751, mode=Mode.SUBTRACT)
    with BuildSketch(Plane(origin=(0, 8, 0), x_dir=(0, 0, -1), z_dir=(1, 0, 0))) as chamfer2_piece_14:
        with BuildLine():
            Line((7.485857864, 0.014142136), (8.014142136, -0.514142136))
            Line((8.014142136, -0.514142136), (8.024142136, -0.514142136))
            ThreePointArc((8.024142136, -0.514142136), (8.01, -0.257071068), (8.01, 0))
            Line((8.01, 0), (8, 0.01))
            ThreePointArc((8, 0.01), (7.742928932, 0.01), (7.485857864, 0.024142136))
            Line((7.485857864, 0.024142136), (7.485857864, 0.014142136))
        make_face()
    revolve(axis=Axis((0, 8, 0), (0, 1, 0)), revolution_arc=180, mode=Mode.SUBTRACT)

    # Sketch27 → Cut-Extrude11 (cut, symmetric)
    with BuildSketch(Plane(origin=(5.448603514, 11.929659995, 0), x_dir=(0.9096172905898658, -0.4154472104370803, 0), z_dir=(0.41544721043708027, 0.9096172905898657, 0))):
        with Locations((15.766417415, 0)):
            Rectangle(SKETCH27_W, SKETCH27_H)
    extrude(amount=CUT_EXTRUDE11_DEPTH, both=True, mode=Mode.SUBTRACT)

    # Fillet13
    fillet13_edges = [part_1.edges().sort_by_distance(p)[0] for p in [
        (26.1778071, 1.5, 5),
        (26.1778071, 1.5, -5),
        (12.14205871, 6.5, 5),
        (12.14205871, 6.5, -5),
    ]]
    fillet(fillet13_edges, radius=FILLET13_R)


with BuildPart() as body_2_2:
    # Sketch18 → Boss-Extrude5 (new body)
    with BuildSketch(Plane(origin=(0, 6, 0), x_dir=(1, 0, 0), z_dir=(0, 1, 0))):
        with Locations(Location((0, 0, 0), (0, 0, 270))):
            Circle(SKETCH18_R)
    extrude(amount=BOSS_EXTRUDE5_DEPTH)

    # Sketch19 → Cut-Extrude6 (cut)
    # profile 1 of 2: a face of its own
    with BuildSketch(Plane(origin=(0, 9, 0), x_dir=(1, 0, 0), z_dir=(0, 1, 0))):
        with BuildLine():
            Line((0, -3), (3.5, -3))
            ThreePointArc((3.5, -3), (6.5, 0), (3.5, 3))
            Line((3.5, 3), (0, 3))
            ThreePointArc((0, 3), (-3, 0), (0, -3))
        make_face()
        with BuildLine():
            ThreePointArc((3.5, -1.5), (5, 0), (3.5, 1.5))
            Line((3.5, 1.5), (0, 1.5))
            ThreePointArc((0, 1.5), (-1.5, 0), (0, -1.5))
            Line((0, -1.5), (3.5, -1.5))
        make_face(mode=Mode.SUBTRACT)
    # profile 2 of 2: a face of its own
    with BuildSketch(Plane(origin=(0, 9, 0), x_dir=(1, 0, 0), z_dir=(0, 1, 0))):
        with BuildLine():
            Line((0, -1.5), (3.5, -1.5))
            ThreePointArc((3.5, -1.5), (5, 0), (3.5, 1.5))
            Line((3.5, 1.5), (0, 1.5))
            ThreePointArc((0, 1.5), (-1.5, 0), (0, -1.5))
        make_face()
    extrude(amount=-CUT_EXTRUDE6_DEPTH, mode=Mode.SUBTRACT)

    # Sketch19<3> → Cut-Extrude7 (cut, through all)
    with BuildSketch(Plane(origin=(0, 9, 0), x_dir=(1, 0, 0), z_dir=(0, 1, 0))):
        with BuildLine():
            Line((0, 1.5), (3.5, 1.5))
            ThreePointArc((3.5, 1.5), (5, 0), (3.5, -1.5))
            Line((3.5, -1.5), (0, -1.5))
            ThreePointArc((0, -1.5), (-1.5, 0), (0, 1.5))
        make_face()
    extrude(amount=-CUT_EXTRUDE7_DEPTH, mode=Mode.SUBTRACT)


solid = Compound([part_1.part, body_2_2.part])
